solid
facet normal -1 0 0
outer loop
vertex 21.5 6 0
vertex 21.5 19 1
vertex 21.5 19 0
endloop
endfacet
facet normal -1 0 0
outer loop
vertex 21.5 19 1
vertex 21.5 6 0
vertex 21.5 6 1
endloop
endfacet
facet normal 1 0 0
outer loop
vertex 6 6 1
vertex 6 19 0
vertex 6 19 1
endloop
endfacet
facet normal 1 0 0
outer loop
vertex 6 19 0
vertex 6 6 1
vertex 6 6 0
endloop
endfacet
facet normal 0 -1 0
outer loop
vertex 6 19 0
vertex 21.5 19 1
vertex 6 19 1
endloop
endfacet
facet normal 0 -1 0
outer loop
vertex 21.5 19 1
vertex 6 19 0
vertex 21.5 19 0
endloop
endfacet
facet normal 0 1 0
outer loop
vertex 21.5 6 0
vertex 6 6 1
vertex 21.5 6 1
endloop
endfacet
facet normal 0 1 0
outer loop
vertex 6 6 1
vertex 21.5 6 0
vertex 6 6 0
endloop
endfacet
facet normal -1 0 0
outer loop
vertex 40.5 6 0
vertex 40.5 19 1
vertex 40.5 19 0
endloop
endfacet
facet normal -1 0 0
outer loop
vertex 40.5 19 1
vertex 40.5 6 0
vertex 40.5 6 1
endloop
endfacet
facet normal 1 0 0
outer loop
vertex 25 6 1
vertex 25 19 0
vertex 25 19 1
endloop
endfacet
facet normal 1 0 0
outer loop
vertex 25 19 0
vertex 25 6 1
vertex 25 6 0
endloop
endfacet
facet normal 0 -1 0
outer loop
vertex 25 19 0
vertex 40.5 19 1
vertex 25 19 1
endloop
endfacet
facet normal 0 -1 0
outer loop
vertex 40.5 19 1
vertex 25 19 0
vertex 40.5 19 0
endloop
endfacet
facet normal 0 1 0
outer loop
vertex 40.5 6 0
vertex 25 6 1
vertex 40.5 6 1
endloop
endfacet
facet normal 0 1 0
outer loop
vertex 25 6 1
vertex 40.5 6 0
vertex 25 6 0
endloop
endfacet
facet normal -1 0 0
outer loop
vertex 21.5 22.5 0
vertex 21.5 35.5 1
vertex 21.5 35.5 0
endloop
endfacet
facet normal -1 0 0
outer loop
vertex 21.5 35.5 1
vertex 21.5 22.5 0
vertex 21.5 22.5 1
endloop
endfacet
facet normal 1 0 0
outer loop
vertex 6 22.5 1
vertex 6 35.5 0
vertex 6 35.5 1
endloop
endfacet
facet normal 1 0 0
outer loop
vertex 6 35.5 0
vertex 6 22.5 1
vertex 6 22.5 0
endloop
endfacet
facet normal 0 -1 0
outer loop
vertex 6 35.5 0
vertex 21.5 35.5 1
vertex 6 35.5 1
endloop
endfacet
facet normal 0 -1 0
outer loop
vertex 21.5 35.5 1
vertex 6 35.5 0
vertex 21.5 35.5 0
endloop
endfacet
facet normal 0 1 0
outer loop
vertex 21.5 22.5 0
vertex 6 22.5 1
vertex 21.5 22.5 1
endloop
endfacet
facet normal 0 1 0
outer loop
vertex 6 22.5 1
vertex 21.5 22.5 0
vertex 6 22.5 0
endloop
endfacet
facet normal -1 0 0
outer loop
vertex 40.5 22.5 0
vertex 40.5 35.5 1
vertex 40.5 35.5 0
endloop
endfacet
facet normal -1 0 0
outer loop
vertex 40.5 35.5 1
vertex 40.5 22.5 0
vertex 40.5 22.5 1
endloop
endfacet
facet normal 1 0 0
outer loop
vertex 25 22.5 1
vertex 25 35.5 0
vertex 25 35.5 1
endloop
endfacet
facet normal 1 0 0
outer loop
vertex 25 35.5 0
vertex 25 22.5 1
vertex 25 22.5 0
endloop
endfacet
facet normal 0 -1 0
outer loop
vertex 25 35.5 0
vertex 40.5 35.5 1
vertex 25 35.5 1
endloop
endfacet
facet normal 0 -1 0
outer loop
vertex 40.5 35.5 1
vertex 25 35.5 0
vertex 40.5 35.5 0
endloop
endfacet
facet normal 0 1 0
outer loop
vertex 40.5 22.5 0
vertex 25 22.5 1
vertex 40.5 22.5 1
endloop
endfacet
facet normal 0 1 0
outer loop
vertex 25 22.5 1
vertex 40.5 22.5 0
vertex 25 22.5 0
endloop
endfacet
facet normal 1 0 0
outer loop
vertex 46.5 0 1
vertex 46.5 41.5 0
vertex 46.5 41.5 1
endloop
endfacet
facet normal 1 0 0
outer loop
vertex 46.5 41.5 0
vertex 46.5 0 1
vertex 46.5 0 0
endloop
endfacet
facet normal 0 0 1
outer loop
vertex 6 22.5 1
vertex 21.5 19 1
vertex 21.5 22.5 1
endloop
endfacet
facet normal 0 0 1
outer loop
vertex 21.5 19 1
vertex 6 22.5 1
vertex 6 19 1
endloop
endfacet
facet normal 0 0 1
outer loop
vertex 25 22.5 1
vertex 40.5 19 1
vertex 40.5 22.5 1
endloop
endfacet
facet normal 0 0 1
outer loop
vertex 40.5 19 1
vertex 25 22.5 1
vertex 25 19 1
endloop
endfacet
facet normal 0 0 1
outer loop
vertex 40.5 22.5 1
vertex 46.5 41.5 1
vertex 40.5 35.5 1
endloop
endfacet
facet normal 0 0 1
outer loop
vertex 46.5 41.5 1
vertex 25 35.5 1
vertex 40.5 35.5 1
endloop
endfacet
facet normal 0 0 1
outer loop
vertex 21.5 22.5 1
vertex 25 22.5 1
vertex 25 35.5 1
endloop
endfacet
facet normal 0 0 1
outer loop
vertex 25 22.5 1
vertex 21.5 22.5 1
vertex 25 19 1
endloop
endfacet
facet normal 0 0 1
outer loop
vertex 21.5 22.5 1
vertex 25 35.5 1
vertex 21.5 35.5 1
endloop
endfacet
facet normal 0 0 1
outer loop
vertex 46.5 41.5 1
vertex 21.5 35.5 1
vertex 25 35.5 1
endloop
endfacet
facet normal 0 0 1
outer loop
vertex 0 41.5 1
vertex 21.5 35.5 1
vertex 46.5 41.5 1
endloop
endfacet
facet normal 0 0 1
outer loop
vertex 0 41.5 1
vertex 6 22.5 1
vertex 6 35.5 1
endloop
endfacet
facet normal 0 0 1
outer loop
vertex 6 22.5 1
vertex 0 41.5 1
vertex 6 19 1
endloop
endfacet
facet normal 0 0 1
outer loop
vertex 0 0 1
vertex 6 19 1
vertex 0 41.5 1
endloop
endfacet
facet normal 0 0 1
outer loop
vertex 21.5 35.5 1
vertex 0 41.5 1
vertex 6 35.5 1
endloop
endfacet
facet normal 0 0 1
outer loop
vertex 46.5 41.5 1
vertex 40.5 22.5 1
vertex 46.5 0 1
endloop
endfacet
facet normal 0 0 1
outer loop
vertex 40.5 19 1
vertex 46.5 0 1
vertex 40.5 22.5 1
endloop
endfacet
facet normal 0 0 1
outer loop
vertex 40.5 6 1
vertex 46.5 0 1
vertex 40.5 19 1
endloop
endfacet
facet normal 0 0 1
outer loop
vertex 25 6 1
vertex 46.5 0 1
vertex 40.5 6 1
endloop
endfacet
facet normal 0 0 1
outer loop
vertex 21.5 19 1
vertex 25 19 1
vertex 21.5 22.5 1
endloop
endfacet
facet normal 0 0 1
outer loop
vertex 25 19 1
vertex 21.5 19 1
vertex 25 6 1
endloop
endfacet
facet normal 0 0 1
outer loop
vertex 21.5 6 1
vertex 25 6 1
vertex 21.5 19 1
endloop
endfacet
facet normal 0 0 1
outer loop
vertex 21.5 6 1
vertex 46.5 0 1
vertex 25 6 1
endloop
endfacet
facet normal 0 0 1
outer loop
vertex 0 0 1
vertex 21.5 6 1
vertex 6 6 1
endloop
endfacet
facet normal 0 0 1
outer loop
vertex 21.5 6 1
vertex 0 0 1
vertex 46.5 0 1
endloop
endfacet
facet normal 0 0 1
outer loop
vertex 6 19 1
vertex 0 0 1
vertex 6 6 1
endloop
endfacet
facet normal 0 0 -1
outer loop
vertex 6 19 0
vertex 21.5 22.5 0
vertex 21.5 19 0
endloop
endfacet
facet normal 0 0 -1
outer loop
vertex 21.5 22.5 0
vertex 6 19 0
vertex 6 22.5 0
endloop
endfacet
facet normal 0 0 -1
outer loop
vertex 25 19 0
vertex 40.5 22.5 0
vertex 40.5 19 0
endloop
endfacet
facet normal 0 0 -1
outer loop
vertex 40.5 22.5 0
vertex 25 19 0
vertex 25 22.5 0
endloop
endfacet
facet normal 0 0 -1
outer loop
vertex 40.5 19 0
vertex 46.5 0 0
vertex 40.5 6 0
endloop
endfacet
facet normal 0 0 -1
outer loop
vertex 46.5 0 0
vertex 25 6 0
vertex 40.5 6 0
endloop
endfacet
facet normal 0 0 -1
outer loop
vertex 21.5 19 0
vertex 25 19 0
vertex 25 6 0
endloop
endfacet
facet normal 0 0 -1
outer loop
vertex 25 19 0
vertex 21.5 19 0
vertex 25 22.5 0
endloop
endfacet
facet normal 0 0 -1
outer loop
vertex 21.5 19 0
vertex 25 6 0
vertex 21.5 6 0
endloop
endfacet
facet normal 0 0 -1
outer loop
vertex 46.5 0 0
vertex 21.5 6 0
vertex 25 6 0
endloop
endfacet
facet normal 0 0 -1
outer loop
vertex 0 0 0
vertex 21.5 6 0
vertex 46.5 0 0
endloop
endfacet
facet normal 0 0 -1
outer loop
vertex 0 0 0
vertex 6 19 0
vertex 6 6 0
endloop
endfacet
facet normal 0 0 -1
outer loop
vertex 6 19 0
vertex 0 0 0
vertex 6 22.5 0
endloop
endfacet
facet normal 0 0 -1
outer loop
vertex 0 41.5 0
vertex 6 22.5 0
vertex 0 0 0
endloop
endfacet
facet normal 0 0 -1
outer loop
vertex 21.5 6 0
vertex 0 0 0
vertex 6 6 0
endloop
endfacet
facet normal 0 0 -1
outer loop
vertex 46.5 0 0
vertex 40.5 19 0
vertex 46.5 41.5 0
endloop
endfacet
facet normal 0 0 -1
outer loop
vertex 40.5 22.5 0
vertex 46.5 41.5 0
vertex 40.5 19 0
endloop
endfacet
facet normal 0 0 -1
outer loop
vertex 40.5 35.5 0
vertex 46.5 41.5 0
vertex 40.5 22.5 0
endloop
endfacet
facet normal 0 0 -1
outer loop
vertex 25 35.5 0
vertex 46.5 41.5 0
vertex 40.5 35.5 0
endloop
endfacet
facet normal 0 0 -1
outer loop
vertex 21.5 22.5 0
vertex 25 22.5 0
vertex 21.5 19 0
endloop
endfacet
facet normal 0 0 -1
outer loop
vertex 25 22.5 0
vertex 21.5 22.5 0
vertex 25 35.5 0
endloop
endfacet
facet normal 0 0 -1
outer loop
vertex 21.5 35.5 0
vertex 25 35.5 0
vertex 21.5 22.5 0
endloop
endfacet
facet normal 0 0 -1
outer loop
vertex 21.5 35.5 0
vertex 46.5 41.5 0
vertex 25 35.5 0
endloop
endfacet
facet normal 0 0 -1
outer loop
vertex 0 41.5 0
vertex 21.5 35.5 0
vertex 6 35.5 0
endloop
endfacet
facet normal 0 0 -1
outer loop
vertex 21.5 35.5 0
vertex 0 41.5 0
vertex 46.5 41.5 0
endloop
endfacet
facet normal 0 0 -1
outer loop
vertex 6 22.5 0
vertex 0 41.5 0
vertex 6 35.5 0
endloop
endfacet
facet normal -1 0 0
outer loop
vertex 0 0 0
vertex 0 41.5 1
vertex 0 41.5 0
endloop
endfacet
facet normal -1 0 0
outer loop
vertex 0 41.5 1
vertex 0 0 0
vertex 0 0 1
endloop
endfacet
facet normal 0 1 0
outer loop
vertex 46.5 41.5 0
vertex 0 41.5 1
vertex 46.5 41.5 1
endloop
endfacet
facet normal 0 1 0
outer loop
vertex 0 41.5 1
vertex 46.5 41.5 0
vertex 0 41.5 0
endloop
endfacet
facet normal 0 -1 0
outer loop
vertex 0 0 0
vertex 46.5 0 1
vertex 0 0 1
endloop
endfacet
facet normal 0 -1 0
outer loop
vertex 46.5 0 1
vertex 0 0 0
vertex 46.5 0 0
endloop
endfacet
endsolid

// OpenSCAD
/* KeySizeTest
 * Make a small 2x2 matrix to test keyholes.
 */
keyCols = 2;
keyRows = 2;
keyX = 15.5;
keyY = 13;
keySpace = 3.5;
edgeSpaceAddition = 4;
edgeSpace = (edgeSpaceAddition*2)-keySpace;
keyZ = -1;

moduleX = (edgeSpace+edgeSpaceAddition)+(keySpace*keyCols)+keyX*(keyCols-1)+keyX;
moduleY = (edgeSpace+edgeSpaceAddition)+(keySpace*keyRows)+keyY*(keyRows-1)+keyY;
moduleZ = 1;

keySize = [keyX, keyY, moduleZ+2];

function position(x,y,z) = [edgeSpace+keySpace*x+keyX*(x-1)-(edgeSpaceAddition/2), edgeSpace+keySpace*y+keyY*(y-1)-(edgeSpaceAddition/2), z];

module keyHoles (yStart, yEnd, xStart, xEnd){
    for(y = [yStart:yEnd]){
        for(x = [xStart:xEnd]){
			translate(position(x,y,keyZ)) cube(keySize);
        }
    }
}

difference(){
    cube([moduleX,moduleY,moduleZ]);

	keyHoles(1,2,1,2);
}
